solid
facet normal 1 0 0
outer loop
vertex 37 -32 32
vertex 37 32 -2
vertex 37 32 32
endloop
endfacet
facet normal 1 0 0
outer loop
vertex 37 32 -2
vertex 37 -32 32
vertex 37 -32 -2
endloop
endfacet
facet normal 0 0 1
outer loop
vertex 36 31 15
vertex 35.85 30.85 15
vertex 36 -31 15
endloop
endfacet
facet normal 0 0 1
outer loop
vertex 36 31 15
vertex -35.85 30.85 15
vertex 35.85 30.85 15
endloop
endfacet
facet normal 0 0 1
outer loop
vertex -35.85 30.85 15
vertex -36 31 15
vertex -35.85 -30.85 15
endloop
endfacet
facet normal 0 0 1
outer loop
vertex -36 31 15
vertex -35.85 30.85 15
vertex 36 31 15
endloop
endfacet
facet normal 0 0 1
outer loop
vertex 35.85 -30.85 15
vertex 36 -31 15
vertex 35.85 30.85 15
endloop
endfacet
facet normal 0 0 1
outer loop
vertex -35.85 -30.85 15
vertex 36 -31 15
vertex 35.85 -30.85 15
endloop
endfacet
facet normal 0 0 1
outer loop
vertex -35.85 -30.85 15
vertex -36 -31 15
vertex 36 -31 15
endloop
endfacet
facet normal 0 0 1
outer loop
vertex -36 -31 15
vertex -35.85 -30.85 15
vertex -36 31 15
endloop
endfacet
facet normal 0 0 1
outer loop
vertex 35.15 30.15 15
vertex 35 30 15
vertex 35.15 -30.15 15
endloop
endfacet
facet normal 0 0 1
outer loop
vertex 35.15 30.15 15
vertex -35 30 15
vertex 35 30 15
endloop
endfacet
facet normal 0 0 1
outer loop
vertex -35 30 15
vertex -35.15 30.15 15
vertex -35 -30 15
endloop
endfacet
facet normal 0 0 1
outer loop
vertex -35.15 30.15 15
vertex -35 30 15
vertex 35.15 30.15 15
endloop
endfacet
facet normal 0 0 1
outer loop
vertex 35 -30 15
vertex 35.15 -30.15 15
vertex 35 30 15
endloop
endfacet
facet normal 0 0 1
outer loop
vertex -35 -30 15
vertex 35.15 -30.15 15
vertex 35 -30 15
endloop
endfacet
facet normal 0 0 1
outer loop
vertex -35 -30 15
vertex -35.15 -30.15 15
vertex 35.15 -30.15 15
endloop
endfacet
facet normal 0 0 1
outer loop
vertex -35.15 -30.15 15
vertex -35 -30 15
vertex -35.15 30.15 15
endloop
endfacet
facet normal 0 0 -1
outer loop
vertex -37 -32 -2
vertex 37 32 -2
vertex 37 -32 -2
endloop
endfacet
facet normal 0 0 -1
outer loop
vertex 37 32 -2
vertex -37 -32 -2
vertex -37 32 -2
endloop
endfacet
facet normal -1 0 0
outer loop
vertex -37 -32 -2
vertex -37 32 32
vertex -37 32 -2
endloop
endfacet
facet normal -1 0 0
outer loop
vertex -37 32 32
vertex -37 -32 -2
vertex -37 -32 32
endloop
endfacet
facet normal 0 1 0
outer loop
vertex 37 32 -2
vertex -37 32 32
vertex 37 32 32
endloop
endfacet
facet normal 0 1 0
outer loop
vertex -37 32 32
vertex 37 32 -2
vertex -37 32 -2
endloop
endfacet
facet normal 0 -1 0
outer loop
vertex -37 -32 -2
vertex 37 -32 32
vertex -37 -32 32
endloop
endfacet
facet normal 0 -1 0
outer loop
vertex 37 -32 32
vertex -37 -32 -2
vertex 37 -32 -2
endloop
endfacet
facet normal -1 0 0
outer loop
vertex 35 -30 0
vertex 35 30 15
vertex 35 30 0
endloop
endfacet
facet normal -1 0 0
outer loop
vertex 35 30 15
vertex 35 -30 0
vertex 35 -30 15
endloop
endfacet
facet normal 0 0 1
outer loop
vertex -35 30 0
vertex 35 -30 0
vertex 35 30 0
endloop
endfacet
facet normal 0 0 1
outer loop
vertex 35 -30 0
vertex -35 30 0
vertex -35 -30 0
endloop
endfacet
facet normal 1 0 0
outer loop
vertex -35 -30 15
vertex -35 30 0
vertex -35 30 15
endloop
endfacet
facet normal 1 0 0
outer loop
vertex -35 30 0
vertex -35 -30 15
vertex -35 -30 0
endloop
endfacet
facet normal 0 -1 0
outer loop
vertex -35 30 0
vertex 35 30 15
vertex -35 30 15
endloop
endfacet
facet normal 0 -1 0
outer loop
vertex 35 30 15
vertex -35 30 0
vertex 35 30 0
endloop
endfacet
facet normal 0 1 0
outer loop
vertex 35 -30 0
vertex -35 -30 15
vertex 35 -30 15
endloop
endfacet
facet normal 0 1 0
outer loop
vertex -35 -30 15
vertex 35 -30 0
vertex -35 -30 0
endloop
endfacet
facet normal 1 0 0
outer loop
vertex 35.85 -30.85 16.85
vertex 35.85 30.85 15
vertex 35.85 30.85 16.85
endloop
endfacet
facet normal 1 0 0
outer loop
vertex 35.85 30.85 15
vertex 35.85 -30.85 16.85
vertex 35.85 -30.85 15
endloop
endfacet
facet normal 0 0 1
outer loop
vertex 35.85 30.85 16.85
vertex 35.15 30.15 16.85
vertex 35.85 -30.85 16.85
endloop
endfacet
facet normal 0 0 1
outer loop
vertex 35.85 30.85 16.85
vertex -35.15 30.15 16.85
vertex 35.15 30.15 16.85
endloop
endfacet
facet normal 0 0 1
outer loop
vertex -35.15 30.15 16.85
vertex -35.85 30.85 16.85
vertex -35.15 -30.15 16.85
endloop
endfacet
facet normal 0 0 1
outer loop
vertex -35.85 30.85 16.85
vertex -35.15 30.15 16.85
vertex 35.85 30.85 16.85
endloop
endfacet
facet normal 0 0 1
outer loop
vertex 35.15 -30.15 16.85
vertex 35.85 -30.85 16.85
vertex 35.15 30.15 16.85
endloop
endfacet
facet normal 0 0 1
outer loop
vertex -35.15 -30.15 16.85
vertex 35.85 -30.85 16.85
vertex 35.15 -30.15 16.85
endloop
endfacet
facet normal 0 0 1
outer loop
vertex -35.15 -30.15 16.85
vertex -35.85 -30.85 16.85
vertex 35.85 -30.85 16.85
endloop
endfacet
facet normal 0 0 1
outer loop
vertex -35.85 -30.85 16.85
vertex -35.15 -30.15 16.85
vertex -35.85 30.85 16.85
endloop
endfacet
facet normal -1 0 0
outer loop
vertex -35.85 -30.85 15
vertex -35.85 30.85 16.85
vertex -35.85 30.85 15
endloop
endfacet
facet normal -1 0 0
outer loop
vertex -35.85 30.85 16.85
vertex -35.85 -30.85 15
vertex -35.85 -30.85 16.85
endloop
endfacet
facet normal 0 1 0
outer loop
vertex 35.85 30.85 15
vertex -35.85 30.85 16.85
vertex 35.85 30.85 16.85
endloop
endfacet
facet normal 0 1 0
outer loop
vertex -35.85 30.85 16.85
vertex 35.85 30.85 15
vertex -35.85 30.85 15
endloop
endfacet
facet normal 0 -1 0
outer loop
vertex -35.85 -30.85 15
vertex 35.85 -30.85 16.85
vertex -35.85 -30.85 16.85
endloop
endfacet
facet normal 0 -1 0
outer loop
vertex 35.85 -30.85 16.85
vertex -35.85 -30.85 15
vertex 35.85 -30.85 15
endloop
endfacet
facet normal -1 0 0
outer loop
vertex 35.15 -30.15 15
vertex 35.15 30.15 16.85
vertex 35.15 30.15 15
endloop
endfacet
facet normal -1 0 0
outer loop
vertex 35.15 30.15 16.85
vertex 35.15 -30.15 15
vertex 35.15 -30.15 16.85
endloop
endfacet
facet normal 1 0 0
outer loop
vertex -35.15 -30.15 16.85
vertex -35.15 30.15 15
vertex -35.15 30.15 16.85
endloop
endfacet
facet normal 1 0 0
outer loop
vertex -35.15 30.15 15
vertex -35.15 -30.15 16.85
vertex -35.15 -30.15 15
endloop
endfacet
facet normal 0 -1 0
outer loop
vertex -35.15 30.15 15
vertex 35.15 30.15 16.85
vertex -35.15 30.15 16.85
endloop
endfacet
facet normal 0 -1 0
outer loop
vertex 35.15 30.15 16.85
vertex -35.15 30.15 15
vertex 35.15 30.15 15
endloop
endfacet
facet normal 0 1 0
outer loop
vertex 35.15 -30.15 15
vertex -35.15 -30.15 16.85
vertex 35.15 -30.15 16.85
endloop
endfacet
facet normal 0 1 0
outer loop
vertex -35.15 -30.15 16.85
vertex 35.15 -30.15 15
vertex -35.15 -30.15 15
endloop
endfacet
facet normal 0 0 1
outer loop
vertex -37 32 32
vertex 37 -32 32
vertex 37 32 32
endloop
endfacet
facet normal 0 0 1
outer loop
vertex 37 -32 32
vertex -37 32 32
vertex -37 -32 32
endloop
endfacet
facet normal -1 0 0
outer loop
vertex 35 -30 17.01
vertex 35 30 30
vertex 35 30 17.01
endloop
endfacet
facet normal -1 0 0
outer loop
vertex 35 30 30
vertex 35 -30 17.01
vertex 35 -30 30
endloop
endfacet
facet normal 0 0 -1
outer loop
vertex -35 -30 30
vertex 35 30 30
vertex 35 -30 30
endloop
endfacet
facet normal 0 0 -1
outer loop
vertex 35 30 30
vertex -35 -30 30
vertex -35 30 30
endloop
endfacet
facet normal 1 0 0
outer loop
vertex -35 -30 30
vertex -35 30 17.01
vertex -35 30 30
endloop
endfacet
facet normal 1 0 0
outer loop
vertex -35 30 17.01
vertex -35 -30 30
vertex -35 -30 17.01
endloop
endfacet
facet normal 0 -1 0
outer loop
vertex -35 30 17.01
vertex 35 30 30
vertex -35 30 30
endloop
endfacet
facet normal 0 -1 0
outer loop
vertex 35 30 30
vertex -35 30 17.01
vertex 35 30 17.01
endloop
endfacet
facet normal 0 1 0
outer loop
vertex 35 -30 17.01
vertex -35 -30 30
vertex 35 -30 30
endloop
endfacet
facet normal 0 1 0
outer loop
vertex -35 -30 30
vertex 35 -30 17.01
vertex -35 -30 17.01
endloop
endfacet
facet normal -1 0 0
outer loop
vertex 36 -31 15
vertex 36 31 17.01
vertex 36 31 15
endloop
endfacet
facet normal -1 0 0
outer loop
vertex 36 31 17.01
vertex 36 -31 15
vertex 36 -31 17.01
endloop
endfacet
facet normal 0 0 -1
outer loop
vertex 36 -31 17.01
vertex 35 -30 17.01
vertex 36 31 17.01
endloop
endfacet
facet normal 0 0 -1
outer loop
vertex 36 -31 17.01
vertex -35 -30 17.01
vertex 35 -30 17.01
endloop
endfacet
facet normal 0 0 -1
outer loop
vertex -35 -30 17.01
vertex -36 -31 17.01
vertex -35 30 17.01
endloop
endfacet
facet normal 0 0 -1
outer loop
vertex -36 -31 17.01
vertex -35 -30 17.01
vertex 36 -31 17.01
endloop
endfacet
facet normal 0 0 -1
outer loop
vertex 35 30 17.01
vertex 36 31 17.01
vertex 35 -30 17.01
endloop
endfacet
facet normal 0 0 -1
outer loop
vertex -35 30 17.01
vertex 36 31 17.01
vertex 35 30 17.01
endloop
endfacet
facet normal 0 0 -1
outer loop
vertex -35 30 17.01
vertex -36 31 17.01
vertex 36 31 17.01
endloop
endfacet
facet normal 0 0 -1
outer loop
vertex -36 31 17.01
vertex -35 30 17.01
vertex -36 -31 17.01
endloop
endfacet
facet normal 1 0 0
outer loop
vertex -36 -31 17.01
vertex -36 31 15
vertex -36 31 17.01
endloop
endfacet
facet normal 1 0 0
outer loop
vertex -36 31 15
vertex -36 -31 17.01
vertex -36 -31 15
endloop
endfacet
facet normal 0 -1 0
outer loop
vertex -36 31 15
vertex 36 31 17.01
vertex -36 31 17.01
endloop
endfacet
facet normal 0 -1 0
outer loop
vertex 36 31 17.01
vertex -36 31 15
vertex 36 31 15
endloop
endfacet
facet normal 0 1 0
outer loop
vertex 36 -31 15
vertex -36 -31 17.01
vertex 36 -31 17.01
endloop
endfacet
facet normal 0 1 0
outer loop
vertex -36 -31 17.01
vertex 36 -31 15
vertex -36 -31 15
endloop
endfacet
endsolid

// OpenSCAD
// ==========================================
// 3D-Printable Two-Part Enclosure
// ==========================================
// Cavity Dimensions: 70 x 60 x 30 mm (Min)
// Wall Thickness: 2.0 mm
// Joint Type: Rebate / Lap Joint with clearance
// Nominal Clearance: 0.15 mm
// ==========================================

// --- Design Parameters ---
cavity_x = 70.0;     // Internal length
cavity_y = 60.0;     // Internal width
cavity_z = 30.0;     // Internal height
wall = 2.0;          // Wall thickness
lip_h = 2.0;         // Vertical height of the alignment lip
clearance = 0.15;    // Print clearance between mating surfaces
split_z = 15.0;      // Z height of the horizontal split plane

// --- Helper Modules ---
// Creates a cube centered in X and Y, starting at Z = 0
module centered_cube(w, d, h) {
    translate([-w/2, -d/2, 0]) cube([w, d, h]);
}

// --- Base Part ---
module enclosure_base() {
    color("LightBlue") {
        union() {
            // Main hollow base body
            difference() {
                // Outer shell
                translate([0, 0, -wall])
                    centered_cube(cavity_x + 2*wall, cavity_y + 2*wall, split_z + wall);
                
                // Inner cavity
                translate([0, 0, 0])
                    centered_cube(cavity_x, cavity_y, split_z + 1.0);
            }
            
            // Alignment Lip (Base male joint)
            // Starts at split plane, height is reduced by clearance
            translate([0, 0, split_z])
                difference() {
                    // Outer boundary of the lip (cleared from the outer pocket step)
                    centered_cube(cavity_x + wall - 2*clearance, cavity_y + wall - 2*clearance, lip_h - clearance);
                    
                    // Inner boundary of the lip (cleared to avoid spilling into the cavity area)
                    translate([0, 0, -0.5])
                        centered_cube(cavity_x + 2*clearance, cavity_y + 2*clearance, lip_h + 1.0);
                }
        }
    }
}

// --- Lid Part ---
module enclosure_lid() {
    color("Tomato") {
        difference() {
            // Main hollow lid body
            difference() {
                // Outer shell
                translate([0, 0, split_z])
                    centered_cube(cavity_x + 2*wall, cavity_y + 2*wall, (cavity_z - split_z) + wall);
                
                // Inner cavity
                translate([0, 0, split_z - 1.0])
                    centered_cube(cavity_x, cavity_y, (cavity_z - split_z) + 1.0);
            }
            
            // Pocket step to receive base lip (Lid female joint)
            translate([0, 0, split_z - 0.01])
                difference() {
                    // Pocket outer bounds (nominal dimensions, clearance is applied on the base lip)
                    centered_cube(cavity_x + wall, cavity_y + wall, lip_h + 0.02);
                    
                    // Keep the inner cavity area open
                    translate([0, 0, -0.5])
                        centered_cube(cavity_x, cavity_y, lip_h + 1.0);
                }
        }
    }
}

// --- Assembly Render ---
enclosure_base();
enclosure_lid();
